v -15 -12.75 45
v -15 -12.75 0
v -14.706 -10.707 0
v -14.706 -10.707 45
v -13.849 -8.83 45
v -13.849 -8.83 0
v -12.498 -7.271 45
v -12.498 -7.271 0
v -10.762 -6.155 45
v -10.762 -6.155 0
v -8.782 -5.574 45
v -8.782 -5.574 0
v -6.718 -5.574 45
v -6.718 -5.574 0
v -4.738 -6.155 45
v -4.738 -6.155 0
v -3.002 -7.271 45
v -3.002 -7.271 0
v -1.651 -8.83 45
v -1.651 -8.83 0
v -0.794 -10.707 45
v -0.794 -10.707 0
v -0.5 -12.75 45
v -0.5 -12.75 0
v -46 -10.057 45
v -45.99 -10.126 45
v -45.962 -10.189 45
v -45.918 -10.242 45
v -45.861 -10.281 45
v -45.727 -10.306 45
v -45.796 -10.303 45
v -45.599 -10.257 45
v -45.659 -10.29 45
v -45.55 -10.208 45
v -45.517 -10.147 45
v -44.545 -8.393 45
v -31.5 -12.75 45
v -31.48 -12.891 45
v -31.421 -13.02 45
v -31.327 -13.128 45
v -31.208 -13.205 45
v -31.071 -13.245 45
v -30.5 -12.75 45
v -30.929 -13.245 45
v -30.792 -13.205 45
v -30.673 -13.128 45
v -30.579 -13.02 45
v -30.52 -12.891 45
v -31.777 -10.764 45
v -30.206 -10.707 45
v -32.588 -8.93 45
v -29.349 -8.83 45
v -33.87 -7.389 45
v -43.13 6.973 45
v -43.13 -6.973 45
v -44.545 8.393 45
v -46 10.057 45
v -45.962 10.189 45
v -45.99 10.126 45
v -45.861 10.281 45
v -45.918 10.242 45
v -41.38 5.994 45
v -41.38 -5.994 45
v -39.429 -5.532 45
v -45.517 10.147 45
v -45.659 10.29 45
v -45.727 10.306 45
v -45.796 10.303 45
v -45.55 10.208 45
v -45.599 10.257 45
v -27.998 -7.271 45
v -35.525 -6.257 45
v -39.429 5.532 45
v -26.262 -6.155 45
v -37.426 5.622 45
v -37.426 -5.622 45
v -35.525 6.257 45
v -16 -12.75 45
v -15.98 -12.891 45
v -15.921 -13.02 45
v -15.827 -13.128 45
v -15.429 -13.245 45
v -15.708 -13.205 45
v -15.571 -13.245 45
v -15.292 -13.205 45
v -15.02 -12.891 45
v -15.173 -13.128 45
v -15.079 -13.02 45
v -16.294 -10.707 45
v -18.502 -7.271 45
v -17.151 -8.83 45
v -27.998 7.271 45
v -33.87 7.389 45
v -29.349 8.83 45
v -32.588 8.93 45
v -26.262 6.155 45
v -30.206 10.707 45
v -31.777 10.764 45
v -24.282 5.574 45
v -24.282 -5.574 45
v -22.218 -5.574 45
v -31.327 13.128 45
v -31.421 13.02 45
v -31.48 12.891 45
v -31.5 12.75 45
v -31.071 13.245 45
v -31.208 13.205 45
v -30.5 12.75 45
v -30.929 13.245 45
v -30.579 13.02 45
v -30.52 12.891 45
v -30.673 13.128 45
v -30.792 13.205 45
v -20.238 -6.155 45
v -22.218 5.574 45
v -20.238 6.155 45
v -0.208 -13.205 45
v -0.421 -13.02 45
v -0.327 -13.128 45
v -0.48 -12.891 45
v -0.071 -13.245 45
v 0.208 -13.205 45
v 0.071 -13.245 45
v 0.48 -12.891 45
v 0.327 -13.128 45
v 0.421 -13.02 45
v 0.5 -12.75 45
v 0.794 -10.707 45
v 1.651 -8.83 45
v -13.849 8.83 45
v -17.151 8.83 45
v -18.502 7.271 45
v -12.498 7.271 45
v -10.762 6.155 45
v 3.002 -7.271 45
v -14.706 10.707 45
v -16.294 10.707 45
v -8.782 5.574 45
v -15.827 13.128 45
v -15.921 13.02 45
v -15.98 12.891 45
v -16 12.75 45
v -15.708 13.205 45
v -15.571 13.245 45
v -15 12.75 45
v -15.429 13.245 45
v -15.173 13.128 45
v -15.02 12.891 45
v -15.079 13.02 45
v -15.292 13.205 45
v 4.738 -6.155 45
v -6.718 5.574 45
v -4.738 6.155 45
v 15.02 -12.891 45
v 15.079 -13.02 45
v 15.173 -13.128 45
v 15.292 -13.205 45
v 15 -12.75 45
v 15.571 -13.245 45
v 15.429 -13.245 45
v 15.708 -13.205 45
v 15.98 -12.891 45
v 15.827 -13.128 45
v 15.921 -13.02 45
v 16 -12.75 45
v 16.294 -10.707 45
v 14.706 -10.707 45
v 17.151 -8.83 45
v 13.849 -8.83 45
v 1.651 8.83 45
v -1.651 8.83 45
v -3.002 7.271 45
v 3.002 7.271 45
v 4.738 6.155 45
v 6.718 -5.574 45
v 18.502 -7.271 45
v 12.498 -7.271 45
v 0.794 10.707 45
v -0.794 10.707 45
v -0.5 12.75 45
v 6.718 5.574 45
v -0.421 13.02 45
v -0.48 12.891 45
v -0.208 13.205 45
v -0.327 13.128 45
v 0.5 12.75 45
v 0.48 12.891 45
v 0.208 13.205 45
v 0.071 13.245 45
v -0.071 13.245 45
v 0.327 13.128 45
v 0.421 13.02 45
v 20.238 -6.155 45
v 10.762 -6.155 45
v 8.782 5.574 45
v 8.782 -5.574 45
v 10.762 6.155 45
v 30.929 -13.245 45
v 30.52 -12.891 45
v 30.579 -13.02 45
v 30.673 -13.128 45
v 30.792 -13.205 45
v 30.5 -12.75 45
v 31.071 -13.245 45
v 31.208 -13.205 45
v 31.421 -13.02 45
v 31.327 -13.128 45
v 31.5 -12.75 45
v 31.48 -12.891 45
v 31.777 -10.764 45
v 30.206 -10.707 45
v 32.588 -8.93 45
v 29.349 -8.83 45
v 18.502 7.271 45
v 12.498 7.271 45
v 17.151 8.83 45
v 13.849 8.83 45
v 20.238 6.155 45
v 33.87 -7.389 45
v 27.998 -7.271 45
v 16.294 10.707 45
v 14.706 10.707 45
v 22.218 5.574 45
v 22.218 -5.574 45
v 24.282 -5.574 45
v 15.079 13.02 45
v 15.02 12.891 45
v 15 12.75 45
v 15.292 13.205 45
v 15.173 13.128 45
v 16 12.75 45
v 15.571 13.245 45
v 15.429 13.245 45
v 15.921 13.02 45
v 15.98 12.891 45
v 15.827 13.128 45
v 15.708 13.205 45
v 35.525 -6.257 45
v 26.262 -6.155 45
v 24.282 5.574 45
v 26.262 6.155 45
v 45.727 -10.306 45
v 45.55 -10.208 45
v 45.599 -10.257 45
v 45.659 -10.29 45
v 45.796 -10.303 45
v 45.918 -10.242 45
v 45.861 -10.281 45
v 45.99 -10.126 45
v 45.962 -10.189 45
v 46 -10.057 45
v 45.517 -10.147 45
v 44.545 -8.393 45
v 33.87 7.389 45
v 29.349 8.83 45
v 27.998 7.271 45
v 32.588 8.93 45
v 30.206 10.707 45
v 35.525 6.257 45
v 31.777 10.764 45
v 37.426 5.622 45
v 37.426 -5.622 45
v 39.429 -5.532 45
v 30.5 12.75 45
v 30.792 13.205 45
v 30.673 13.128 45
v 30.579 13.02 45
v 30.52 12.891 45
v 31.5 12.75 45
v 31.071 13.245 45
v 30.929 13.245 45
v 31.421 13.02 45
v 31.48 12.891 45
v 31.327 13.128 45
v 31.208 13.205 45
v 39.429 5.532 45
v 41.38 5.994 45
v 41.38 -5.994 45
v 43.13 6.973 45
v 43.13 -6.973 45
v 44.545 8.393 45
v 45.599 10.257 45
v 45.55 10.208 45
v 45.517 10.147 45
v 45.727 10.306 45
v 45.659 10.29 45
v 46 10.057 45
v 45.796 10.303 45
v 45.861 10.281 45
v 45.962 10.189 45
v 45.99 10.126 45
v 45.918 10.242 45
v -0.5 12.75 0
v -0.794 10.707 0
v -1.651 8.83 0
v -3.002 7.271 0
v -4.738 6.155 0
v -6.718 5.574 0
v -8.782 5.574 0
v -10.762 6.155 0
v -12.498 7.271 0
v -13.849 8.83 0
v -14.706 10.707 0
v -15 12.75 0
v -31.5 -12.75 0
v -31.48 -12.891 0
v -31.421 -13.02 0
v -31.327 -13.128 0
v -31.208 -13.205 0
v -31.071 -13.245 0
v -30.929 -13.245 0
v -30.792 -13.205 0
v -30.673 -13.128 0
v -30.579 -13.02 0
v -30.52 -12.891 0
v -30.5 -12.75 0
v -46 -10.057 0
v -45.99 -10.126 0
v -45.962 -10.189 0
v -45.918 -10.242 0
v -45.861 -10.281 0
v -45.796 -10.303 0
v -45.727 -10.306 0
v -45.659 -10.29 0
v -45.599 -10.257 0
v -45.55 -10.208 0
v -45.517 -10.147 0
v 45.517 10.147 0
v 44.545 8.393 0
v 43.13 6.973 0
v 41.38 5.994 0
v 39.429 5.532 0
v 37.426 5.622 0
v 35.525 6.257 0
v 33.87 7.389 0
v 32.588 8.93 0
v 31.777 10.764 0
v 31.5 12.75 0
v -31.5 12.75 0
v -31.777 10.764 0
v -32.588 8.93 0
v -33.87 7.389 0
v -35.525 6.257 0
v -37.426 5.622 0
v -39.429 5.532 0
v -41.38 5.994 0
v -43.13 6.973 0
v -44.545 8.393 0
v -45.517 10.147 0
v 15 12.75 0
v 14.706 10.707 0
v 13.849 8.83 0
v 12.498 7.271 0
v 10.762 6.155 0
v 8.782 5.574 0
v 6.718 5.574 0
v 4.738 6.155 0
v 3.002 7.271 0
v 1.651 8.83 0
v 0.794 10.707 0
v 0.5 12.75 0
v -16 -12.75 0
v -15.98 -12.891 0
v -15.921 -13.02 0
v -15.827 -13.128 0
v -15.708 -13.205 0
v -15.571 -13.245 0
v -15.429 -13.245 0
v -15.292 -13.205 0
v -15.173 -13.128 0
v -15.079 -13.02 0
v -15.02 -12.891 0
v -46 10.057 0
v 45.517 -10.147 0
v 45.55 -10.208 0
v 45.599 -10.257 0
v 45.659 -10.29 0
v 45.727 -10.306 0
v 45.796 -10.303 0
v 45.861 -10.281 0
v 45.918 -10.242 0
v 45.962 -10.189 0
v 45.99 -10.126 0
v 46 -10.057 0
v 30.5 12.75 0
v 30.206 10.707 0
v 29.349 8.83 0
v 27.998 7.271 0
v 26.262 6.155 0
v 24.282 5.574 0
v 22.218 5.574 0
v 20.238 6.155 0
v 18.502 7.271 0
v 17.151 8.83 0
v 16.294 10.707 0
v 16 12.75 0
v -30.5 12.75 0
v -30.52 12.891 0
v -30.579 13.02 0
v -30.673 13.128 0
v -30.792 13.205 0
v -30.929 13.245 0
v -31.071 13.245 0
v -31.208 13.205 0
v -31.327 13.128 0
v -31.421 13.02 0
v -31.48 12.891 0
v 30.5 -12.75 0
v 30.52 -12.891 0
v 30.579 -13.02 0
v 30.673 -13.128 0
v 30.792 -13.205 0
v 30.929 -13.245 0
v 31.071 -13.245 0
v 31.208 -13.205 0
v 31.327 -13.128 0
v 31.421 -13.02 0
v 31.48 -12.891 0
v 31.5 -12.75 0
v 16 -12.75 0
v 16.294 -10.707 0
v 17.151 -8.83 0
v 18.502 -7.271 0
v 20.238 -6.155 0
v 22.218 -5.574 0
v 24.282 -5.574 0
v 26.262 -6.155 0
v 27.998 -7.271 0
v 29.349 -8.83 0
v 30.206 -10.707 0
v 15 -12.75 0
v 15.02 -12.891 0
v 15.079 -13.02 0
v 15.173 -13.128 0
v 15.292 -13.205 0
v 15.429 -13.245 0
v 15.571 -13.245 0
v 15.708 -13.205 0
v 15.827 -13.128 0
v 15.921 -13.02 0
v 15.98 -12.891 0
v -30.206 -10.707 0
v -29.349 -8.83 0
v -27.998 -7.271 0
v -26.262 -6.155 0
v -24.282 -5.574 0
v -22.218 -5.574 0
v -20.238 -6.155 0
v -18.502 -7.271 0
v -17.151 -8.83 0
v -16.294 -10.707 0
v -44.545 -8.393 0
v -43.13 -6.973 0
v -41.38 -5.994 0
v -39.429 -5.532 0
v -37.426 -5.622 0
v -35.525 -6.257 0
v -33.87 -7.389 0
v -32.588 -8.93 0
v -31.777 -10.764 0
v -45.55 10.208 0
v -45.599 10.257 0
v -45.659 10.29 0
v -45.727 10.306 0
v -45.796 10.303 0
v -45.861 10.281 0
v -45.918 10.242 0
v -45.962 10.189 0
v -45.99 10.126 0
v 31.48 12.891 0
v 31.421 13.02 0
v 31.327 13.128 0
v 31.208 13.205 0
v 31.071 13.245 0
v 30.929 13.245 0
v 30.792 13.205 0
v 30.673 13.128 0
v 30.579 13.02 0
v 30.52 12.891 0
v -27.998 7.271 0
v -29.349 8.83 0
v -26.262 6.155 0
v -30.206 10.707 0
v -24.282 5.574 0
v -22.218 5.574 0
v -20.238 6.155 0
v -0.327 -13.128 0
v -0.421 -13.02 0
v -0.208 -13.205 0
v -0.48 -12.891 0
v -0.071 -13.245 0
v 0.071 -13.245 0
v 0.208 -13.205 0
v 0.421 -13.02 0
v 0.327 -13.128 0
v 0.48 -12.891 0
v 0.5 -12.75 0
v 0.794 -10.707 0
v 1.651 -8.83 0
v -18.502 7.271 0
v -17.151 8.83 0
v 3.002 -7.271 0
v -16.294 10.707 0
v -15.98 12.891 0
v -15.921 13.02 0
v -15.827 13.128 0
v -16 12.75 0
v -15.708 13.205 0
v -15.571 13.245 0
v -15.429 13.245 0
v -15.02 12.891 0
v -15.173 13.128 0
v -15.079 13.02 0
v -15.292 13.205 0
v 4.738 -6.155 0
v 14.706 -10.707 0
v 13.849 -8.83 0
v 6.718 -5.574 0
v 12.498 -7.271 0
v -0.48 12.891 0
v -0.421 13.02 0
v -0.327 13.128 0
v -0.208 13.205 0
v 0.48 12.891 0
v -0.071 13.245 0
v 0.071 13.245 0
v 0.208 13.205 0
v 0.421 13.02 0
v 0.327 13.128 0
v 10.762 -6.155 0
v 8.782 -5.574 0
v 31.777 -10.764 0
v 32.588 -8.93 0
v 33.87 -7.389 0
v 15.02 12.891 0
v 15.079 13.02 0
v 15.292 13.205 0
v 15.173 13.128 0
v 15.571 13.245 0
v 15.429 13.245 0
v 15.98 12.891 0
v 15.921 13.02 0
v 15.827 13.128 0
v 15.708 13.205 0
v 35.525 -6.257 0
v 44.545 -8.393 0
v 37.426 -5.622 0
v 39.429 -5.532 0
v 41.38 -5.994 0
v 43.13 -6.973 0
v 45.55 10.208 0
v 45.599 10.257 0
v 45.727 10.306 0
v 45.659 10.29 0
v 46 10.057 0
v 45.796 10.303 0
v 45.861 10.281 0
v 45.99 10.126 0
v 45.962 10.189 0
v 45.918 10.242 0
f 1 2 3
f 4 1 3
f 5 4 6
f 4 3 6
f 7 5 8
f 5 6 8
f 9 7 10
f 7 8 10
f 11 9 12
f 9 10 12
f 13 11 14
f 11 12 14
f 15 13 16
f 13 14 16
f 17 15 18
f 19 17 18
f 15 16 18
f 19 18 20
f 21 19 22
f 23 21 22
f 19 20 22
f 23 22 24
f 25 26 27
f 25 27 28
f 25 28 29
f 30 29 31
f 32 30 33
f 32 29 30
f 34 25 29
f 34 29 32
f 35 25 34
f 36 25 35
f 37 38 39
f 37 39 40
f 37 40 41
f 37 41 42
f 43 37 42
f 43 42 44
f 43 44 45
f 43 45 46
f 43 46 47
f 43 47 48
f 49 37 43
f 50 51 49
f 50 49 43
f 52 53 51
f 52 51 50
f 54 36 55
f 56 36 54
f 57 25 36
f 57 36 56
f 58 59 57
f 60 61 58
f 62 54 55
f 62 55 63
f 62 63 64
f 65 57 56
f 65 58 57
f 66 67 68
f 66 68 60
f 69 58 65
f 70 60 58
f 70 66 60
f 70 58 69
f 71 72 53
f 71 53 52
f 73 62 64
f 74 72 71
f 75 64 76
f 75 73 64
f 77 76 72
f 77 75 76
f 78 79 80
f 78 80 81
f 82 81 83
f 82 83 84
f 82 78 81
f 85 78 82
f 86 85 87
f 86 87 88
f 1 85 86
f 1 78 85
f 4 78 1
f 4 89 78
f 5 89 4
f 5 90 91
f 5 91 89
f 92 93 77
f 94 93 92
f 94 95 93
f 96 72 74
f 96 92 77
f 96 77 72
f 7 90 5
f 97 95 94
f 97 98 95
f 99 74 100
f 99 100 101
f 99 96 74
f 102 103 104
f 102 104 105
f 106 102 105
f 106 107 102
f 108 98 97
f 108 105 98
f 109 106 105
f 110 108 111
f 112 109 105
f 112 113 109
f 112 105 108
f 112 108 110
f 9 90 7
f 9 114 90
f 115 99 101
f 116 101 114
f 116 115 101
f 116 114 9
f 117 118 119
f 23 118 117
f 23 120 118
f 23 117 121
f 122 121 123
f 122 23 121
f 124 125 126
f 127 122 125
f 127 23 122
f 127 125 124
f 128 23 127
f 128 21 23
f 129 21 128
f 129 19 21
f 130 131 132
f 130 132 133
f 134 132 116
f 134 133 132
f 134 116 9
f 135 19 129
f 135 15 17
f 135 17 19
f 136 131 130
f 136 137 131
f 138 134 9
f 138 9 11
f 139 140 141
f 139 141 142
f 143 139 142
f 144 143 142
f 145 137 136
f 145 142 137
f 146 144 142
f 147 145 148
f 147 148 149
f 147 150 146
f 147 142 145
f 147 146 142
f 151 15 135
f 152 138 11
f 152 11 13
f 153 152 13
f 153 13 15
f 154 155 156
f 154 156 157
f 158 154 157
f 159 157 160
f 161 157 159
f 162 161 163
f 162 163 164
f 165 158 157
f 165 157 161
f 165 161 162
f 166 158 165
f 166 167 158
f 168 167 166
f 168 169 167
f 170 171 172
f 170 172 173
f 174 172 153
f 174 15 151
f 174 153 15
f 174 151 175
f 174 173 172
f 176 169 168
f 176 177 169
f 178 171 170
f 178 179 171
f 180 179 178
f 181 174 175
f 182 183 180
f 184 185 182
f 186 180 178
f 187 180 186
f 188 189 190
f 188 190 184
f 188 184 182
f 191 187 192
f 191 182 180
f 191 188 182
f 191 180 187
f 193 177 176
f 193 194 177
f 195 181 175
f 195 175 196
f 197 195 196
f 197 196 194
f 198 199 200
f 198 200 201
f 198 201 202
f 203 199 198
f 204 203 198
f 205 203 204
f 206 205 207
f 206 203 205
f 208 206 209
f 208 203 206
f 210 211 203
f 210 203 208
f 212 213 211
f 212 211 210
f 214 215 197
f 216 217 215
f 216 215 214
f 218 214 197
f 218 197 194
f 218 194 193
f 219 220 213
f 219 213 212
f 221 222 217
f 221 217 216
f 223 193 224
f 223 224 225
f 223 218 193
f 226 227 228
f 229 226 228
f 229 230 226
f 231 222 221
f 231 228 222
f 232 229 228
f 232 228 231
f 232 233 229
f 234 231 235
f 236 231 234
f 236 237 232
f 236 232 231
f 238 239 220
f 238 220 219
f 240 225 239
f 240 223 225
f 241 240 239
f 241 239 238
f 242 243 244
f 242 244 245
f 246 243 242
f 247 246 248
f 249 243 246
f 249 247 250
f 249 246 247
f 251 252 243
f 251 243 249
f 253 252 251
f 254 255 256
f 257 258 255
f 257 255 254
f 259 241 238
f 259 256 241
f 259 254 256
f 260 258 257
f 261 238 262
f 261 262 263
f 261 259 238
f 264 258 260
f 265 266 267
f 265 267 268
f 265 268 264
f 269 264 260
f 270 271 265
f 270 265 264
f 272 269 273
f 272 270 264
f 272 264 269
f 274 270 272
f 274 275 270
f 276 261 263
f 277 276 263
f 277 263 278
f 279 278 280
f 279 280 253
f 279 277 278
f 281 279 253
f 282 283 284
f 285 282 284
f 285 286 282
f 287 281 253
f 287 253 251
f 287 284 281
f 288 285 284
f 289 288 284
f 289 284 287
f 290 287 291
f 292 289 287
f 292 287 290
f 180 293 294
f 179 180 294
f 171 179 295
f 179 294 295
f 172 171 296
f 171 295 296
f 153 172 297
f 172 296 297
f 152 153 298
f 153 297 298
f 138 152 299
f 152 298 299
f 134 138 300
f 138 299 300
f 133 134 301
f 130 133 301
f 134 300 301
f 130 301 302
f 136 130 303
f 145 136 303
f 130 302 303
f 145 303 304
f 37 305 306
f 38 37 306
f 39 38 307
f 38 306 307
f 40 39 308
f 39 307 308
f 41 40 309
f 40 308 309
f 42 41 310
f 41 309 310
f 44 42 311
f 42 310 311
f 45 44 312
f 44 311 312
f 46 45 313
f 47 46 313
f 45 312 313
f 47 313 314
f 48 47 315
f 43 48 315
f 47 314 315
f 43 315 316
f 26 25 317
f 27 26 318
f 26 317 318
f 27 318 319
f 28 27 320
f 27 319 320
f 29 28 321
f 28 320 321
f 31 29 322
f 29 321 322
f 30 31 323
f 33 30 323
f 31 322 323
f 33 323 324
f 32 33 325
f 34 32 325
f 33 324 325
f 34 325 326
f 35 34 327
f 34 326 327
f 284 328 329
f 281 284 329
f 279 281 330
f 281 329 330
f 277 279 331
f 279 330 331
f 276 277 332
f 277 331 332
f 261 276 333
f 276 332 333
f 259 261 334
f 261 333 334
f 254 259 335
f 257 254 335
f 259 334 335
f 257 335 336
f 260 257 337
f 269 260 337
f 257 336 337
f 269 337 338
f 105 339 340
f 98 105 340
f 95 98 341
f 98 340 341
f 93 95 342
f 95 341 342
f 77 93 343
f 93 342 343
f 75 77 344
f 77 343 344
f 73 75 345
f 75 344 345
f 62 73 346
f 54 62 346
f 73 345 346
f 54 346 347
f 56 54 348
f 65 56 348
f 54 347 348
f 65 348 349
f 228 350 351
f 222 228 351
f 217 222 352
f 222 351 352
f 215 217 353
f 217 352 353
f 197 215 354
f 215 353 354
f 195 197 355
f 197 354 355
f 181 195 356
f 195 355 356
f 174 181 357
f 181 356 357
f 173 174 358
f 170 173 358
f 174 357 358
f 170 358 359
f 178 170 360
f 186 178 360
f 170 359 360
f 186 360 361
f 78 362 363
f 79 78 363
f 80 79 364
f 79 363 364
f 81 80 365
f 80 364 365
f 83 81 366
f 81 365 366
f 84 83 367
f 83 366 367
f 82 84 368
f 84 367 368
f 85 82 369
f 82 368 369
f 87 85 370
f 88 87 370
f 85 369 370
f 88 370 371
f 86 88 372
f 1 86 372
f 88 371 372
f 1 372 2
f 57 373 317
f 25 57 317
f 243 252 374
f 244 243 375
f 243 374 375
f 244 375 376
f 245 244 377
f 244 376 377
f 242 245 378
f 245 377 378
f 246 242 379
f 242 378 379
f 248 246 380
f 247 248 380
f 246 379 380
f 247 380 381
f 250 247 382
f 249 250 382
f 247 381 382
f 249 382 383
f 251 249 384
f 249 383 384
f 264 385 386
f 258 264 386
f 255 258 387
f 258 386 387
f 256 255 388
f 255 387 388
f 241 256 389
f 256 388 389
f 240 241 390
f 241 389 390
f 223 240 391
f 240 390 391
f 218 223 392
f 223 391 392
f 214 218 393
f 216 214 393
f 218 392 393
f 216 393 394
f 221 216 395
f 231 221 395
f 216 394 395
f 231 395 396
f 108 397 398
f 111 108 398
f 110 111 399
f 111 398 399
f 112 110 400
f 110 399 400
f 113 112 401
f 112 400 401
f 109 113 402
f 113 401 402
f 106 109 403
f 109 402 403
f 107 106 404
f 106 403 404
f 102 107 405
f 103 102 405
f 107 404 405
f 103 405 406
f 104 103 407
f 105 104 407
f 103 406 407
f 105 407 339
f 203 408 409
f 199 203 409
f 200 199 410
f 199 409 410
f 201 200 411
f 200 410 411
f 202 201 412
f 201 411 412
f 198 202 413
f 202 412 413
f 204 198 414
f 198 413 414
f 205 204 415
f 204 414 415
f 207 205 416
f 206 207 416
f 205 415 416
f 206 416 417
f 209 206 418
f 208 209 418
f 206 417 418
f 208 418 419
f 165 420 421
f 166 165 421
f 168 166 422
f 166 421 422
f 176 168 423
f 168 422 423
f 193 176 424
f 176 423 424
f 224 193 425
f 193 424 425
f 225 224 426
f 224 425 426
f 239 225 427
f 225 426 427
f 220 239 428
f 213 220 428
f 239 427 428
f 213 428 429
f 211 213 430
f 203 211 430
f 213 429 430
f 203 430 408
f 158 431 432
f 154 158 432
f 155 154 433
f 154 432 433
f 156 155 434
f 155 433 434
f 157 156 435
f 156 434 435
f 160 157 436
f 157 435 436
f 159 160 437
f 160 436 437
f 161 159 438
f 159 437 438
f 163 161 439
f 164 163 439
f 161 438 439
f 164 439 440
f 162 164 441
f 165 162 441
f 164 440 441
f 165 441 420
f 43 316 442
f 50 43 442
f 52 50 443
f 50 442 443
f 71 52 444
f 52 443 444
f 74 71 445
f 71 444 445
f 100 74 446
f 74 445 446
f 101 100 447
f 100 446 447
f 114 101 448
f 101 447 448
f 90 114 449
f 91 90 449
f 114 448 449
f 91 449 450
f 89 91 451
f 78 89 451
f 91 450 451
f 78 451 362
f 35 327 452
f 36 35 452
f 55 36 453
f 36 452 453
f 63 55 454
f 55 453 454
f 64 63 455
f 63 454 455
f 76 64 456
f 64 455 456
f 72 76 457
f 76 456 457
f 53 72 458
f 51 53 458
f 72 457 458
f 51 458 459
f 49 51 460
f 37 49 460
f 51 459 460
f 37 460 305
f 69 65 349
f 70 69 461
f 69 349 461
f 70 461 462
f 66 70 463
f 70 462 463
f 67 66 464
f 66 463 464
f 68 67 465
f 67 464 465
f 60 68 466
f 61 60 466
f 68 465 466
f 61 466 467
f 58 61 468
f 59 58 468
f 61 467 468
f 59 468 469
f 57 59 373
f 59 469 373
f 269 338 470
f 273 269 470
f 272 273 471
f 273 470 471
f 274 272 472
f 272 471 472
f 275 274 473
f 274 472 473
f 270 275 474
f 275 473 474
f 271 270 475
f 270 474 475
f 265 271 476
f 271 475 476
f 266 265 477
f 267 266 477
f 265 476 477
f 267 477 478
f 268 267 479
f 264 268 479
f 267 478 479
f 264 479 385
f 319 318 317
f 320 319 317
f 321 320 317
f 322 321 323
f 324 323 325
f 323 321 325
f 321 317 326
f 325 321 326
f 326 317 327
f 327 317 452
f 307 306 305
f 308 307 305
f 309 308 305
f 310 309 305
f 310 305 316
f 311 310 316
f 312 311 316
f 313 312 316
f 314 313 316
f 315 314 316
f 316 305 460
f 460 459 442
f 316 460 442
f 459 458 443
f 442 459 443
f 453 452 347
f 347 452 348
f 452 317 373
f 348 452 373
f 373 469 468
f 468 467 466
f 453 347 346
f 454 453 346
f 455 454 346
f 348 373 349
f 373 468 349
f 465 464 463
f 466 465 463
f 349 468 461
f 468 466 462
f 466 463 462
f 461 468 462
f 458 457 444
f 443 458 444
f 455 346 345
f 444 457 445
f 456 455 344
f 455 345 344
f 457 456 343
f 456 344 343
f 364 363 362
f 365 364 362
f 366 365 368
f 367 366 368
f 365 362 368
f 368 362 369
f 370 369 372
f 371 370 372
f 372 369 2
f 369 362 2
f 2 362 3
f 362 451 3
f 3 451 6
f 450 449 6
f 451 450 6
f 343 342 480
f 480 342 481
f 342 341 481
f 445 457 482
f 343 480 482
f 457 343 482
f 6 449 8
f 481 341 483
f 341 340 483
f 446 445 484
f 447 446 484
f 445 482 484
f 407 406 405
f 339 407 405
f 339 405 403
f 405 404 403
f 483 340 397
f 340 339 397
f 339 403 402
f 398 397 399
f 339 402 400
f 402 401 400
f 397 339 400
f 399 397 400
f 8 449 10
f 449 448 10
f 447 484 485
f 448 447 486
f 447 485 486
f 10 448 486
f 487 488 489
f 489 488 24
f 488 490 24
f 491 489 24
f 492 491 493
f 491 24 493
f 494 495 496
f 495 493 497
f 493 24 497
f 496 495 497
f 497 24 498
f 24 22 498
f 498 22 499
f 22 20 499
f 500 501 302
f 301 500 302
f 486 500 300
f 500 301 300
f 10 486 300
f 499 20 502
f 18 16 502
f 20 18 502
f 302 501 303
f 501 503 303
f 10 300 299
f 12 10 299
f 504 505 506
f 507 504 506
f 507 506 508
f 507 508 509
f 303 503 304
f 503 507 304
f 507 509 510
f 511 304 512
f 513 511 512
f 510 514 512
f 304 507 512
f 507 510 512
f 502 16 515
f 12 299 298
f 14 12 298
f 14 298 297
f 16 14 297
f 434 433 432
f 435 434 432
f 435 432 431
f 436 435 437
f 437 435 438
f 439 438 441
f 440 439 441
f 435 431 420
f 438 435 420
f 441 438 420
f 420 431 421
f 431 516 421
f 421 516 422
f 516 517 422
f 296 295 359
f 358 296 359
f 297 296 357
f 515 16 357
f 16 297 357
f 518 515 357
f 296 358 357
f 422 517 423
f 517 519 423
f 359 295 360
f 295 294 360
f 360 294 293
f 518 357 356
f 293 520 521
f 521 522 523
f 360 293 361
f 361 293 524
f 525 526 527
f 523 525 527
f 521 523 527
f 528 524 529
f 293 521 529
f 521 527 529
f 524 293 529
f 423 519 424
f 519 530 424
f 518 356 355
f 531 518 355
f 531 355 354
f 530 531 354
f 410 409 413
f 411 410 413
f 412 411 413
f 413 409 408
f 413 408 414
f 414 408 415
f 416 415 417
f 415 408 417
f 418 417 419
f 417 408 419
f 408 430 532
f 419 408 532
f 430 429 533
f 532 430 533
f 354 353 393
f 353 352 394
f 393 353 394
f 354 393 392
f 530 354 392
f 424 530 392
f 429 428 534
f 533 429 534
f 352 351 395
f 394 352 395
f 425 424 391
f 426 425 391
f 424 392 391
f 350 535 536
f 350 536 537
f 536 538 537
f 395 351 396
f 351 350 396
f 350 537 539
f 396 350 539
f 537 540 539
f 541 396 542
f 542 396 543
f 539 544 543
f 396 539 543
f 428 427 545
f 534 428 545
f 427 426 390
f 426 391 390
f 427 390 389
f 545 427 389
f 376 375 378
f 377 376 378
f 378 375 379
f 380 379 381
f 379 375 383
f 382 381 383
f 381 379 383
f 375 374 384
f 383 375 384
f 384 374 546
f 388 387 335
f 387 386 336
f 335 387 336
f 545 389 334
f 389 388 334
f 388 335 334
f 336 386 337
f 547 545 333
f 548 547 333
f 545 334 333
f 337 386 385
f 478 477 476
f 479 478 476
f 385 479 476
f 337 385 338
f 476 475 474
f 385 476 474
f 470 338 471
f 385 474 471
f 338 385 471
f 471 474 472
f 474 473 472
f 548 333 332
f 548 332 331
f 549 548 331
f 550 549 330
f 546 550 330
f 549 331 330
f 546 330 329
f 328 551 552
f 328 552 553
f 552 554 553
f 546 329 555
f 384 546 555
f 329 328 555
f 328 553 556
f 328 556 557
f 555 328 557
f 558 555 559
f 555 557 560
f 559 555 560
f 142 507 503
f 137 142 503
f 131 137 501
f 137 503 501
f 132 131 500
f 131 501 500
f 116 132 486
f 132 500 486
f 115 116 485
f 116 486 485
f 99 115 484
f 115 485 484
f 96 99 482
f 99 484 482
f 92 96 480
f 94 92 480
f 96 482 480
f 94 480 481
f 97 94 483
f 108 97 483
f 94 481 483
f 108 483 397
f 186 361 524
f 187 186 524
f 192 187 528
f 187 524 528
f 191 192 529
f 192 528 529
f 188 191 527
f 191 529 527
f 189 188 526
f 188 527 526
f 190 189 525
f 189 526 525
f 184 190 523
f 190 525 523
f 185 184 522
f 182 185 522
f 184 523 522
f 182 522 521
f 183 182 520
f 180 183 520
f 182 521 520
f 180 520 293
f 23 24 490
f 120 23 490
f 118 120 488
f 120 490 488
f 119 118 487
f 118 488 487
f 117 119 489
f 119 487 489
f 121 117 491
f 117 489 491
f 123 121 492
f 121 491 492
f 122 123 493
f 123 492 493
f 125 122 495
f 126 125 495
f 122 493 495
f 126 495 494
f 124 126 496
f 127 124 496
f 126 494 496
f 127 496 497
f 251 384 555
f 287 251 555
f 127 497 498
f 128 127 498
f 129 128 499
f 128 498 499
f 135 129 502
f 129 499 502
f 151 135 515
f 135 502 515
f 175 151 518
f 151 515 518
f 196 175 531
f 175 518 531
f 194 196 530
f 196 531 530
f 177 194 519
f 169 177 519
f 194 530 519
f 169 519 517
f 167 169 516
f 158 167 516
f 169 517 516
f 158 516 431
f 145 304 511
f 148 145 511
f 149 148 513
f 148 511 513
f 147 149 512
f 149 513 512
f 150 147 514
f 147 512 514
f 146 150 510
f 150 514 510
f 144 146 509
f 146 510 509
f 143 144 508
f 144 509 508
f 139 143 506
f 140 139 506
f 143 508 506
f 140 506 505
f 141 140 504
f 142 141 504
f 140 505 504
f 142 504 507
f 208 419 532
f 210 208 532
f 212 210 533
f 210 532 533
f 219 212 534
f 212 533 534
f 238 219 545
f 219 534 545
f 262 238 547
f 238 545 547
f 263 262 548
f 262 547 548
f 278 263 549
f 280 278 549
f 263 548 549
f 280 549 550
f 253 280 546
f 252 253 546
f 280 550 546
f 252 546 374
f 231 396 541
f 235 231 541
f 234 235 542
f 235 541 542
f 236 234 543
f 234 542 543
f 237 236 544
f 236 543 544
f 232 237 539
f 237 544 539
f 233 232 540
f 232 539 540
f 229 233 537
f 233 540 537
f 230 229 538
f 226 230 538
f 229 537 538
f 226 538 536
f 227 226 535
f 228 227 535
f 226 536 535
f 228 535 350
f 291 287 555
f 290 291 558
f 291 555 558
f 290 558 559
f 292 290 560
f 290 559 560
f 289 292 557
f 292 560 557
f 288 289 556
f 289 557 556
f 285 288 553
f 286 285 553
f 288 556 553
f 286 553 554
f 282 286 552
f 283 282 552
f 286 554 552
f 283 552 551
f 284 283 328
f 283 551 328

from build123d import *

# Parameters (mm, degrees)
BOSS_EXTRU_1_DEPTH = 45


with BuildPart() as part:
    # Esquisse1 → Boss.-Extru.1 (new body)
    with BuildSketch(Plane.XY):
        with BuildLine():
            Line((-46, 10.057417596), (-46, -10.057417596))
            ThreePointArc((-46, -10.057417596), (-45.795643546, -10.303215616), (-45.516666667, -10.147170343))
            ThreePointArc((-45.516666667, -10.147170343), (-37.426337153, -5.621857418), (-31.5, -12.75))
            ThreePointArc((-31.5, -12.75), (-31, -13.25), (-30.5, -12.75))
            ThreePointArc((-30.5, -12.75), (-23.25, -5.5), (-16, -12.75))
            ThreePointArc((-16, -12.75), (-15.5, -13.25), (-15, -12.75))
            ThreePointArc((-15, -12.75), (-7.75, -5.5), (-0.5, -12.75))
            ThreePointArc((-0.5, -12.75), (0, -13.25), (0.5, -12.75))
            ThreePointArc((0.5, -12.75), (7.75, -5.5), (15, -12.75))
            ThreePointArc((15, -12.75), (15.5, -13.25), (16, -12.75))
            ThreePointArc((16, -12.75), (23.25, -5.5), (30.5, -12.75))
            ThreePointArc((30.5, -12.75), (31, -13.25), (31.5, -12.75))
            ThreePointArc((31.5, -12.75), (37.426337153, -5.621857418), (45.516666667, -10.147170343))
            ThreePointArc((45.516666667, -10.147170343), (45.795643546, -10.303215616), (46, -10.057417596))
            Line((46, -10.057417596), (46, 10.057417596))
            ThreePointArc((46, 10.057417596), (45.795643546, 10.303215616), (45.516666667, 10.147170343))
            ThreePointArc((45.516666667, 10.147170343), (37.426337153, 5.621857418), (31.5, 12.75))
            ThreePointArc((31.5, 12.75), (31, 13.25), (30.5, 12.75))
            ThreePointArc((30.5, 12.75), (23.25, 5.5), (16, 12.75))
            ThreePointArc((16, 12.75), (15.5, 13.25), (15, 12.75))
            ThreePointArc((15, 12.75), (7.75, 5.5), (0.5, 12.75))
            ThreePointArc((0.5, 12.75), (0, 13.25), (-0.5, 12.75))
            ThreePointArc((-0.5, 12.75), (-7.75, 5.5), (-15, 12.75))
            ThreePointArc((-15, 12.75), (-15.5, 13.25), (-16, 12.75))
            ThreePointArc((-16, 12.75), (-23.25, 5.5), (-30.5, 12.75))
            ThreePointArc((-30.5, 12.75), (-31, 13.25), (-31.5, 12.75))
            ThreePointArc((-31.5, 12.75), (-37.426337153, 5.621857418), (-45.516666667, 10.147170343))
            ThreePointArc((-45.516666667, 10.147170343), (-45.795643546, 10.303215616), (-46, 10.057417596))
        make_face()
    extrude(amount=BOSS_EXTRU_1_DEPTH)


solid = part.part
